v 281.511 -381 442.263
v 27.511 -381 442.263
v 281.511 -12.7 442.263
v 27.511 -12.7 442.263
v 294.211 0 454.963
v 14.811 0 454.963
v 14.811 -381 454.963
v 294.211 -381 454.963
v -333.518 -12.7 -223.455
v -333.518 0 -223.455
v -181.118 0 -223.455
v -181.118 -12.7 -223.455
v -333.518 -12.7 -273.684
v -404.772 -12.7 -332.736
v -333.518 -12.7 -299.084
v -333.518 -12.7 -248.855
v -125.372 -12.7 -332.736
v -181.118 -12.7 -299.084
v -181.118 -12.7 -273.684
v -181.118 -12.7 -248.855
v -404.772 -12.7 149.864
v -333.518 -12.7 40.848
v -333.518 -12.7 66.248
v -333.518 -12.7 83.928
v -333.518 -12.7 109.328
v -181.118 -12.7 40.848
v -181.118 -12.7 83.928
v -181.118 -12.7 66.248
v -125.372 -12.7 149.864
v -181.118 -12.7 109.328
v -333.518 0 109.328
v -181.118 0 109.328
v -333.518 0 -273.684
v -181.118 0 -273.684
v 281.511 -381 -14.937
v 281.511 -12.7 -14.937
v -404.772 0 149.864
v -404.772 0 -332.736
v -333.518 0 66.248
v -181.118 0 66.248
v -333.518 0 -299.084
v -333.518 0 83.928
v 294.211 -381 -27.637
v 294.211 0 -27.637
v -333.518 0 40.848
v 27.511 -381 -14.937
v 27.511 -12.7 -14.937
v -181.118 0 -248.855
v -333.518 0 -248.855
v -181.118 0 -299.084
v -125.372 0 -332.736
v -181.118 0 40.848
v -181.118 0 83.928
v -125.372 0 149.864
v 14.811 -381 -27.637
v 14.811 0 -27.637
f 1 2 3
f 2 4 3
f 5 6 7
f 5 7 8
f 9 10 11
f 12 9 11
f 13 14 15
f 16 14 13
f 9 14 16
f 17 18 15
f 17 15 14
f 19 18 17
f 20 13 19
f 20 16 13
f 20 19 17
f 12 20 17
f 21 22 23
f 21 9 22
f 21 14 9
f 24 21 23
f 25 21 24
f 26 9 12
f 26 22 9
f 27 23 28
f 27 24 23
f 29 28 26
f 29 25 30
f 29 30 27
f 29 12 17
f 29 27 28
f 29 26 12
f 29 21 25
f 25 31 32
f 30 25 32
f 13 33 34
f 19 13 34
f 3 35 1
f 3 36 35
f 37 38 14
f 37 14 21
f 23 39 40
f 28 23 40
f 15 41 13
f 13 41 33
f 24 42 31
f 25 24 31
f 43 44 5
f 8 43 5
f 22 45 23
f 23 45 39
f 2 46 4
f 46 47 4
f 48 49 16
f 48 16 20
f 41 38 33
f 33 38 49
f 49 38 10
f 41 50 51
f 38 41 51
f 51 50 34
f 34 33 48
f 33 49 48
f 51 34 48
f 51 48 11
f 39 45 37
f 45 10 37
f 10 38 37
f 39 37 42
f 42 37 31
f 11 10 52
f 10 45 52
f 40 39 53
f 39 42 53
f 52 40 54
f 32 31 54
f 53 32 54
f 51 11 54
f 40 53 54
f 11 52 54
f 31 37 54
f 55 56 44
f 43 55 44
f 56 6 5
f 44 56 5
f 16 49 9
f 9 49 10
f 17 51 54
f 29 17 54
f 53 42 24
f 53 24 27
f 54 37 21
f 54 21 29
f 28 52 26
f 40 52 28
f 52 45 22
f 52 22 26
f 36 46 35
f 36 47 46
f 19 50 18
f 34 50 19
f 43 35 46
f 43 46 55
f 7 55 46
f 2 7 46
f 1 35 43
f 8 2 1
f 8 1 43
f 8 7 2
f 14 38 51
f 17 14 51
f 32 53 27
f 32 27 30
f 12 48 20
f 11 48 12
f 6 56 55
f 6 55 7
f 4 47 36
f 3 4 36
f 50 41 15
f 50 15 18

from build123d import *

# Parameters (mm, degrees)
F0_W     = 279.4
F0_H     = 482.6
F1_DEPTH = 381
F2_W     = 279.4
F2_H     = 482.6
F2_W_2   = 152.4
F2_H_2   = 25.4
F3_DEPTH = 12.7
F4_T     = -12.7


with BuildPart() as f1:
    # F0 (on Front) → F1 (new body)
    with BuildSketch(Plane.XZ):
        with Locations((154.511011, 213.662958)):
            Rectangle(F0_W, F0_H)
    extrude(amount=F1_DEPTH)

    # F4
    f4_openings = [f1.faces().sort_by_distance(p)[0] for p in [
        (154.511011, -381, 213.662958),
    ]]
    offset(amount=F4_T, openings=f4_openings)


with BuildPart() as f3:
    # F2 (on Front) → F3 (new body)
    with BuildSketch(Plane.XZ):
        with Locations((-265.07165, -91.436313)):
            Rectangle(F2_W, F2_H)
        with Locations((-257.318326, -286.38365)):
            Rectangle(F2_W_2, F2_H_2, mode=Mode.SUBTRACT)
        with Locations((-257.318326, -236.155054)):
            Rectangle(F2_W_2, F2_H_2, mode=Mode.SUBTRACT)
        with Locations((-257.318326, 53.54757)):
            Rectangle(F2_W_2, F2_H_2, mode=Mode.SUBTRACT)
        with Locations((-257.318326, 96.627915)):
            Rectangle(F2_W_2, F2_H_2, mode=Mode.SUBTRACT)
    extrude(amount=F3_DEPTH)


solid = Compound([f1.part, f3.part])
